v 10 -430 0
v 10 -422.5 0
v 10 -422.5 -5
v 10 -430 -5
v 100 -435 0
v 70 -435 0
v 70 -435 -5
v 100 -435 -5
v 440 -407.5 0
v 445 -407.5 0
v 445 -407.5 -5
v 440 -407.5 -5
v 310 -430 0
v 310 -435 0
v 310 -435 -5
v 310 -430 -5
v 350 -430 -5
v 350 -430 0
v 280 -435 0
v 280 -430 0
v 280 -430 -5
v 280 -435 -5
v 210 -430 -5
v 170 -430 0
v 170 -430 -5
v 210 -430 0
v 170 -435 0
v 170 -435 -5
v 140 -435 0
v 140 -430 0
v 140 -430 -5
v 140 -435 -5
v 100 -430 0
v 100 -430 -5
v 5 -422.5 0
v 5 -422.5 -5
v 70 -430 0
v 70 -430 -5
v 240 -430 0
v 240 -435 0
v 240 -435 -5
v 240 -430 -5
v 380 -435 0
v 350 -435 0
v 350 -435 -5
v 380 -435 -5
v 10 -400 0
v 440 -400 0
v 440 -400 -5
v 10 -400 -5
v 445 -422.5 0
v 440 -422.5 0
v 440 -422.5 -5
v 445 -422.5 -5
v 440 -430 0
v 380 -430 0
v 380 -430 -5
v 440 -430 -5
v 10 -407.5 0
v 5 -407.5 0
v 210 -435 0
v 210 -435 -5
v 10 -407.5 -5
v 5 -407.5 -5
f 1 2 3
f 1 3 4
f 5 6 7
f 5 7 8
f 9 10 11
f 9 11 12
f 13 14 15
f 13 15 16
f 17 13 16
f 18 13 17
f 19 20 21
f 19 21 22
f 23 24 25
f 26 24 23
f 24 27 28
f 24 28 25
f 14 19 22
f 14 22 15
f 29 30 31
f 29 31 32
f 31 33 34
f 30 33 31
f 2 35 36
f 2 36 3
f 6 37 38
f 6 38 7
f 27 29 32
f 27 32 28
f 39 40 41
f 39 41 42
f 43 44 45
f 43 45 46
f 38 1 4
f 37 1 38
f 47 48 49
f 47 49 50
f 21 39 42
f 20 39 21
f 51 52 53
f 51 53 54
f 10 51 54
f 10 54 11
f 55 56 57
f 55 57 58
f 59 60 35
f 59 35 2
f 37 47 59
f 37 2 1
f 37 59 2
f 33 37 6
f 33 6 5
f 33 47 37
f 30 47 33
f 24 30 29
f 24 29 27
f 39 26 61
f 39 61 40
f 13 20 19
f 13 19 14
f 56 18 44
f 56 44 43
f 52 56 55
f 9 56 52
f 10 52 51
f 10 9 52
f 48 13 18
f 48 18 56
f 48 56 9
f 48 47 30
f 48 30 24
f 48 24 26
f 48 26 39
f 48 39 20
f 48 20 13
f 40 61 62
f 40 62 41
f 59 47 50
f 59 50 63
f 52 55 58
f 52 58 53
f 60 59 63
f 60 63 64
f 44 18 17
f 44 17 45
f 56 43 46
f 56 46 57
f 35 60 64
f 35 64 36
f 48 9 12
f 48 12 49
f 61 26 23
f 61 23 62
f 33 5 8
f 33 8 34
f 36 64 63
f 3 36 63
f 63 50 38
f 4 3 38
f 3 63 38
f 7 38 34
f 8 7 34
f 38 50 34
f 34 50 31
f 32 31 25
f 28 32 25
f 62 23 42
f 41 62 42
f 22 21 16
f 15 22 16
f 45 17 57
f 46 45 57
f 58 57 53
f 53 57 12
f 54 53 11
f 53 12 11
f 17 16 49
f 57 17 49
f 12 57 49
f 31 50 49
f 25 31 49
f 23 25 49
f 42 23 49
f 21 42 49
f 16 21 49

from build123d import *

# Parameters (mm, degrees)
BOSS_EXTRUDE1_DEPTH = 5


with BuildPart() as part:
    # Sketch1 → Boss-Extrude1 (new body)
    with BuildSketch(Plane.XY):
        Polygon((440.000271395, -430), (440.000271395, -422.5), (445, -422.5), (445, -407.5), (440.000271395, -407.5), (440.000271395, -400), (9.999728605, -400), (9.999728605, -407.5), (5, -407.5), (5, -422.5), (9.999728605, -422.5), (9.999728605, -430), (70, -430), (70, -435), (100, -435), (100, -430), (140, -430), (140, -435), (170, -435), (170, -430), (210, -430), (210, -435), (240, -435), (240, -430), (280, -430), (280, -435), (310, -435), (310, -430), (350, -430), (350, -435), (380, -435), (380, -430), align=None)
    extrude(amount=-BOSS_EXTRUDE1_DEPTH)


solid = part.part
